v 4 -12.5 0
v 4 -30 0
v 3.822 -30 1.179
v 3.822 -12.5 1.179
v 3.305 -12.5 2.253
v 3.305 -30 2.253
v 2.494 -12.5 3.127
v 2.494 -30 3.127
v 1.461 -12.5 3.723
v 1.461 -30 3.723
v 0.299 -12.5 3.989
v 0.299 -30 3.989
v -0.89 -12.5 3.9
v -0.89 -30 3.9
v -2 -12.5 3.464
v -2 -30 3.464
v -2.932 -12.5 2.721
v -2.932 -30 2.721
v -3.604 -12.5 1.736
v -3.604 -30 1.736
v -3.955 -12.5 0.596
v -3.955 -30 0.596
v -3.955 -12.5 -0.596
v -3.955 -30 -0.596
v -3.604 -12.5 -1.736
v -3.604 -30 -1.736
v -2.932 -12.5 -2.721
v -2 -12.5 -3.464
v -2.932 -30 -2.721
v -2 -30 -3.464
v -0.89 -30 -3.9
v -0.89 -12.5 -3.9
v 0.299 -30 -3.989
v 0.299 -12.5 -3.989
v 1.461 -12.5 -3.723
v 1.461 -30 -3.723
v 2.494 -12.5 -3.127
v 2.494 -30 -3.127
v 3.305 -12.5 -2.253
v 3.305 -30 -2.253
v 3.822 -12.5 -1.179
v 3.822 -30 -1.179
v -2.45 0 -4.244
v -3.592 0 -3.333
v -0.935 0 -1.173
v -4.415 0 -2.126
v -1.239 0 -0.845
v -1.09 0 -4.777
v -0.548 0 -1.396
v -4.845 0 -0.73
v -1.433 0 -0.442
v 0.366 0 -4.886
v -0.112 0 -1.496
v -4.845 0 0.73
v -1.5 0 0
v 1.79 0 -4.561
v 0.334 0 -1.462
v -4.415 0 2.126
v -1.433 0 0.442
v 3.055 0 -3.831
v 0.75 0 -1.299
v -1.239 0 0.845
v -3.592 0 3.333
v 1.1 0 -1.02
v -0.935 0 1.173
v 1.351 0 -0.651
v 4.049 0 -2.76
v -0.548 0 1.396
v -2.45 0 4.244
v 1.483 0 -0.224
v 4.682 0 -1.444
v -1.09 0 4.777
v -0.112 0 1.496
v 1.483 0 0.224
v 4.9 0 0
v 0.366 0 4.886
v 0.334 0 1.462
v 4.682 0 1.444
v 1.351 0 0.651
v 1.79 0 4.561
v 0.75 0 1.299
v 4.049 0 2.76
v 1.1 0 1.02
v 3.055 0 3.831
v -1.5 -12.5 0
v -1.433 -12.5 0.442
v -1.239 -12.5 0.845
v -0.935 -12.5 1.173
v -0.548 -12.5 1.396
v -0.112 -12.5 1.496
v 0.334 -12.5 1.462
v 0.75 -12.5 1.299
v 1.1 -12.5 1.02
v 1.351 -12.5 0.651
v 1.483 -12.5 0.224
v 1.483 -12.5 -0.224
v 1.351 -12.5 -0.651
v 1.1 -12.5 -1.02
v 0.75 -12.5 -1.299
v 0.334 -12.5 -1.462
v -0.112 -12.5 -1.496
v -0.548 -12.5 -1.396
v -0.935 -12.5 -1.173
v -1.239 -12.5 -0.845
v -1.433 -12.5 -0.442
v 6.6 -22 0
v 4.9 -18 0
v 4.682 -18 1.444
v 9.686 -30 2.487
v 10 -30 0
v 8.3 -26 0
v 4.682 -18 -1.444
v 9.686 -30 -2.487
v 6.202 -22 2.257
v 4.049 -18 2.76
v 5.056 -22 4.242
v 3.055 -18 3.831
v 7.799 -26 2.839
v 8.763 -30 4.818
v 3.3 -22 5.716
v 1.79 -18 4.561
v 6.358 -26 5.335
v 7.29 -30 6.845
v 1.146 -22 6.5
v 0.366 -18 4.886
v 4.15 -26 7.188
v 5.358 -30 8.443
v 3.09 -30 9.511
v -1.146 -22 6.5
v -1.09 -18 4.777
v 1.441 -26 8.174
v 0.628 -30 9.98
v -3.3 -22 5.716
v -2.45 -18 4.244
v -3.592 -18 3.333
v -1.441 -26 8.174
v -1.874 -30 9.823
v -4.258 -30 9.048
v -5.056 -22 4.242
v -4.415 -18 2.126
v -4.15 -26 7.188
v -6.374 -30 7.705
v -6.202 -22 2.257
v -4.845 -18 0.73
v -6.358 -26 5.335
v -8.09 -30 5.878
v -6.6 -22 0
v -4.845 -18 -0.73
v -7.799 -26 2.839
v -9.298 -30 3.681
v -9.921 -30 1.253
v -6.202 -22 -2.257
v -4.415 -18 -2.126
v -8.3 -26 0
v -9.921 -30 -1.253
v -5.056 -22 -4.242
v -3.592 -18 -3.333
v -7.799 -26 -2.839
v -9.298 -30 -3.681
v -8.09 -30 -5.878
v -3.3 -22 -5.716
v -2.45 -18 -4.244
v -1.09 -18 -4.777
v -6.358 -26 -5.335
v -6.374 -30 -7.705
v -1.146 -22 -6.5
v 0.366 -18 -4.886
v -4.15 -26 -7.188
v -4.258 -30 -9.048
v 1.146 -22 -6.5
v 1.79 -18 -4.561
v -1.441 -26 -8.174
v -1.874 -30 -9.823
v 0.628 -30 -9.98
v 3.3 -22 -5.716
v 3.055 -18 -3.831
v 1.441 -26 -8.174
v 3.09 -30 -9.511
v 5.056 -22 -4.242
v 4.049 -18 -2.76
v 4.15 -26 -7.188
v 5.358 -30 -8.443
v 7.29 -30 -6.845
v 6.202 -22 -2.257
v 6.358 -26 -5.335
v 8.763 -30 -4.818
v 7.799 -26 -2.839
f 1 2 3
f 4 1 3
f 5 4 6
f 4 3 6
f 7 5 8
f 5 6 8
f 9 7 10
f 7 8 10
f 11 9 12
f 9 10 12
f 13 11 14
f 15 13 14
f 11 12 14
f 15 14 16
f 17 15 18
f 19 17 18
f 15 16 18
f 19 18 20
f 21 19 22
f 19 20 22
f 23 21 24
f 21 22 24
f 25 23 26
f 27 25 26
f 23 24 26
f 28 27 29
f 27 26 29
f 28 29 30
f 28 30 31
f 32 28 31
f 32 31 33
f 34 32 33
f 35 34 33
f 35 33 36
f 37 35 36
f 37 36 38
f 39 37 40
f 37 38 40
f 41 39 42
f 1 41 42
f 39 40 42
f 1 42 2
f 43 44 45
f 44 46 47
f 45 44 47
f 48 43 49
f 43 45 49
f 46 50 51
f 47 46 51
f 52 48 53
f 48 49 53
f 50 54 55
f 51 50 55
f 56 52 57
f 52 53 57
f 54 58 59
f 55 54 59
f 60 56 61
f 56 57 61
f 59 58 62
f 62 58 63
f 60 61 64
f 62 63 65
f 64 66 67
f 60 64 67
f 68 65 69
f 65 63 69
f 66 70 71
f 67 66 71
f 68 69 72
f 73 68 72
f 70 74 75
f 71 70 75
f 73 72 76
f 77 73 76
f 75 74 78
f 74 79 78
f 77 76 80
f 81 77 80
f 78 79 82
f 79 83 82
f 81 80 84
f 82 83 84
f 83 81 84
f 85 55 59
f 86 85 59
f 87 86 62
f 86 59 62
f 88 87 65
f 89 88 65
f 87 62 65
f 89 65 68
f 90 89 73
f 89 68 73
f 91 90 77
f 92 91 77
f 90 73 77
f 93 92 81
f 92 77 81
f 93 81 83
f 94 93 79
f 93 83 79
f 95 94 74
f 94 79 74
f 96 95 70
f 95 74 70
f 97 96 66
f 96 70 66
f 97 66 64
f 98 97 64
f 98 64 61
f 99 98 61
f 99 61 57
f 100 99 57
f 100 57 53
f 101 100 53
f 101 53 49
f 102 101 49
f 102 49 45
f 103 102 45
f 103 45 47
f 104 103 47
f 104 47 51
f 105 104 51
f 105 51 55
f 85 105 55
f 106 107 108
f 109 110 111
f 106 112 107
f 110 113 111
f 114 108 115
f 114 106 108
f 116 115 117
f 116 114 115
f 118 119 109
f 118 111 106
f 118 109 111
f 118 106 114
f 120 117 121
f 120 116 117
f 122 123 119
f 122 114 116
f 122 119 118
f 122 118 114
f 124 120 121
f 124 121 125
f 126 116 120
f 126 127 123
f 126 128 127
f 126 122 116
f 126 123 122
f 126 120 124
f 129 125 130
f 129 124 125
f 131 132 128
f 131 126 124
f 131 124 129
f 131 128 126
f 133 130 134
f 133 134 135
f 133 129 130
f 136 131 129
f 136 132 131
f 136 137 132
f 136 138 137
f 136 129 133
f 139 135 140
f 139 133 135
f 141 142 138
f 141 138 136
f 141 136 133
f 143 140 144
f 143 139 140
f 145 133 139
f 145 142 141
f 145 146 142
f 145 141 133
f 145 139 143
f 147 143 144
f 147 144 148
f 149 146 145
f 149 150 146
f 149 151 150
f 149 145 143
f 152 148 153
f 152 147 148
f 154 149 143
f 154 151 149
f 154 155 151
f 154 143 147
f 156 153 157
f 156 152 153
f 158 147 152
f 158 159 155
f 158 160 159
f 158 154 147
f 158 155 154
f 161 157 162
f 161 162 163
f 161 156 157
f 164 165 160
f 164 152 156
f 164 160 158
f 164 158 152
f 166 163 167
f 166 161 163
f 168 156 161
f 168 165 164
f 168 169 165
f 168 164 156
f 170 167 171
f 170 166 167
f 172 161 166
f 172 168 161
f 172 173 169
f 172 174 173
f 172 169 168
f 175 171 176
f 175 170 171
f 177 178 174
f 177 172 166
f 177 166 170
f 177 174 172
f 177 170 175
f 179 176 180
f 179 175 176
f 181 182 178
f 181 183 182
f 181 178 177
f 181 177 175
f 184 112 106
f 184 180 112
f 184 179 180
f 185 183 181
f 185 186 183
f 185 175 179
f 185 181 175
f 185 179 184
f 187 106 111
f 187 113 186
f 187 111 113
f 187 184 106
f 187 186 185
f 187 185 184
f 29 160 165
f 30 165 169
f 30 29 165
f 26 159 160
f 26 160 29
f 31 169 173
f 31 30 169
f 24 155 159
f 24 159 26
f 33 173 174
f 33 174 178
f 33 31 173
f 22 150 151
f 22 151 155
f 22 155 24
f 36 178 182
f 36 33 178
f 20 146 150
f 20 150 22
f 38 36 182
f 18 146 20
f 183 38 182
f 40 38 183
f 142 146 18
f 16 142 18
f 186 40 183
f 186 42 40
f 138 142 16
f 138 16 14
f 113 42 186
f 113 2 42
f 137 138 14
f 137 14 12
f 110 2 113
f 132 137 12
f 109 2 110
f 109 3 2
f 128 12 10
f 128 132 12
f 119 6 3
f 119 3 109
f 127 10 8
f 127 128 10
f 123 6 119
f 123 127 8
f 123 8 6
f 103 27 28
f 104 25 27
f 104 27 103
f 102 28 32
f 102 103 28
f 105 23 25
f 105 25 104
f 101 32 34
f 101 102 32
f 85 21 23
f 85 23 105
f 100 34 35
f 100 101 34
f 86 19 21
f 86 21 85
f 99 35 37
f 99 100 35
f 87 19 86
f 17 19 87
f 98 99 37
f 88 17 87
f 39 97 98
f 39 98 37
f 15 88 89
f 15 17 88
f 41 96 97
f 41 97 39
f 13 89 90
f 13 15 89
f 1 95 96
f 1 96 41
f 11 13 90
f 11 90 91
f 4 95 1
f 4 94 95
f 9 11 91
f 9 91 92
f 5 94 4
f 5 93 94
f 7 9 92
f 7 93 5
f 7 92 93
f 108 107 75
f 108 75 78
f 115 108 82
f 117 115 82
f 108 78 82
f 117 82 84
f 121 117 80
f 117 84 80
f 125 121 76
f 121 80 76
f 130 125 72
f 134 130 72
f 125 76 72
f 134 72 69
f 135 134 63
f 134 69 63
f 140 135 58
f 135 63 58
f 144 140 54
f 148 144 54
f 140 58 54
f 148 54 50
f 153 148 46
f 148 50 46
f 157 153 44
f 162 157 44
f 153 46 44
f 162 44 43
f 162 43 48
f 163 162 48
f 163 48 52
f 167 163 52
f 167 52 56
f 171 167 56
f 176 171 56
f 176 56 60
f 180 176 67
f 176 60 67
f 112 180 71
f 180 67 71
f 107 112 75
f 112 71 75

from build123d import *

# Parameters (mm, degrees)
F0_R      = 4.9
F1_DEPTH  = 18
F1_FACE_R = 4.9
F3_R      = 10
F5_R      = 1.5
F6_DEPTH  = 15
F7_R      = 4
F8_DEPTH  = 17.5


with BuildPart() as f1:
    # F0 (on Front) → F1 (new body)
    with BuildSketch(Plane.XZ):
        Circle(F0_R)
    extrude(amount=F1_DEPTH)

    # F1_face (on face) → F4 section 0
    with BuildSketch(Plane.XZ.offset(18)):
        Circle(F1_FACE_R)
    # F3 (on offset) → F4 section 1
    with BuildSketch(Plane.XZ.offset(30)):
        Circle(F3_R)
    loft()

    # F5 (on face) → F6 (cut)
    with BuildSketch(Plane(origin=(0, 0, 0), x_dir=(-1, 0, 0), z_dir=(0, 1, 0))):
        Circle(F5_R)
    extrude(amount=-F6_DEPTH, mode=Mode.SUBTRACT)

    # F7 (on face) → F8 (cut)
    with BuildSketch(Plane.XZ.offset(30)):
        Circle(F7_R)
    extrude(amount=-F8_DEPTH, mode=Mode.SUBTRACT)


solid = f1.part
